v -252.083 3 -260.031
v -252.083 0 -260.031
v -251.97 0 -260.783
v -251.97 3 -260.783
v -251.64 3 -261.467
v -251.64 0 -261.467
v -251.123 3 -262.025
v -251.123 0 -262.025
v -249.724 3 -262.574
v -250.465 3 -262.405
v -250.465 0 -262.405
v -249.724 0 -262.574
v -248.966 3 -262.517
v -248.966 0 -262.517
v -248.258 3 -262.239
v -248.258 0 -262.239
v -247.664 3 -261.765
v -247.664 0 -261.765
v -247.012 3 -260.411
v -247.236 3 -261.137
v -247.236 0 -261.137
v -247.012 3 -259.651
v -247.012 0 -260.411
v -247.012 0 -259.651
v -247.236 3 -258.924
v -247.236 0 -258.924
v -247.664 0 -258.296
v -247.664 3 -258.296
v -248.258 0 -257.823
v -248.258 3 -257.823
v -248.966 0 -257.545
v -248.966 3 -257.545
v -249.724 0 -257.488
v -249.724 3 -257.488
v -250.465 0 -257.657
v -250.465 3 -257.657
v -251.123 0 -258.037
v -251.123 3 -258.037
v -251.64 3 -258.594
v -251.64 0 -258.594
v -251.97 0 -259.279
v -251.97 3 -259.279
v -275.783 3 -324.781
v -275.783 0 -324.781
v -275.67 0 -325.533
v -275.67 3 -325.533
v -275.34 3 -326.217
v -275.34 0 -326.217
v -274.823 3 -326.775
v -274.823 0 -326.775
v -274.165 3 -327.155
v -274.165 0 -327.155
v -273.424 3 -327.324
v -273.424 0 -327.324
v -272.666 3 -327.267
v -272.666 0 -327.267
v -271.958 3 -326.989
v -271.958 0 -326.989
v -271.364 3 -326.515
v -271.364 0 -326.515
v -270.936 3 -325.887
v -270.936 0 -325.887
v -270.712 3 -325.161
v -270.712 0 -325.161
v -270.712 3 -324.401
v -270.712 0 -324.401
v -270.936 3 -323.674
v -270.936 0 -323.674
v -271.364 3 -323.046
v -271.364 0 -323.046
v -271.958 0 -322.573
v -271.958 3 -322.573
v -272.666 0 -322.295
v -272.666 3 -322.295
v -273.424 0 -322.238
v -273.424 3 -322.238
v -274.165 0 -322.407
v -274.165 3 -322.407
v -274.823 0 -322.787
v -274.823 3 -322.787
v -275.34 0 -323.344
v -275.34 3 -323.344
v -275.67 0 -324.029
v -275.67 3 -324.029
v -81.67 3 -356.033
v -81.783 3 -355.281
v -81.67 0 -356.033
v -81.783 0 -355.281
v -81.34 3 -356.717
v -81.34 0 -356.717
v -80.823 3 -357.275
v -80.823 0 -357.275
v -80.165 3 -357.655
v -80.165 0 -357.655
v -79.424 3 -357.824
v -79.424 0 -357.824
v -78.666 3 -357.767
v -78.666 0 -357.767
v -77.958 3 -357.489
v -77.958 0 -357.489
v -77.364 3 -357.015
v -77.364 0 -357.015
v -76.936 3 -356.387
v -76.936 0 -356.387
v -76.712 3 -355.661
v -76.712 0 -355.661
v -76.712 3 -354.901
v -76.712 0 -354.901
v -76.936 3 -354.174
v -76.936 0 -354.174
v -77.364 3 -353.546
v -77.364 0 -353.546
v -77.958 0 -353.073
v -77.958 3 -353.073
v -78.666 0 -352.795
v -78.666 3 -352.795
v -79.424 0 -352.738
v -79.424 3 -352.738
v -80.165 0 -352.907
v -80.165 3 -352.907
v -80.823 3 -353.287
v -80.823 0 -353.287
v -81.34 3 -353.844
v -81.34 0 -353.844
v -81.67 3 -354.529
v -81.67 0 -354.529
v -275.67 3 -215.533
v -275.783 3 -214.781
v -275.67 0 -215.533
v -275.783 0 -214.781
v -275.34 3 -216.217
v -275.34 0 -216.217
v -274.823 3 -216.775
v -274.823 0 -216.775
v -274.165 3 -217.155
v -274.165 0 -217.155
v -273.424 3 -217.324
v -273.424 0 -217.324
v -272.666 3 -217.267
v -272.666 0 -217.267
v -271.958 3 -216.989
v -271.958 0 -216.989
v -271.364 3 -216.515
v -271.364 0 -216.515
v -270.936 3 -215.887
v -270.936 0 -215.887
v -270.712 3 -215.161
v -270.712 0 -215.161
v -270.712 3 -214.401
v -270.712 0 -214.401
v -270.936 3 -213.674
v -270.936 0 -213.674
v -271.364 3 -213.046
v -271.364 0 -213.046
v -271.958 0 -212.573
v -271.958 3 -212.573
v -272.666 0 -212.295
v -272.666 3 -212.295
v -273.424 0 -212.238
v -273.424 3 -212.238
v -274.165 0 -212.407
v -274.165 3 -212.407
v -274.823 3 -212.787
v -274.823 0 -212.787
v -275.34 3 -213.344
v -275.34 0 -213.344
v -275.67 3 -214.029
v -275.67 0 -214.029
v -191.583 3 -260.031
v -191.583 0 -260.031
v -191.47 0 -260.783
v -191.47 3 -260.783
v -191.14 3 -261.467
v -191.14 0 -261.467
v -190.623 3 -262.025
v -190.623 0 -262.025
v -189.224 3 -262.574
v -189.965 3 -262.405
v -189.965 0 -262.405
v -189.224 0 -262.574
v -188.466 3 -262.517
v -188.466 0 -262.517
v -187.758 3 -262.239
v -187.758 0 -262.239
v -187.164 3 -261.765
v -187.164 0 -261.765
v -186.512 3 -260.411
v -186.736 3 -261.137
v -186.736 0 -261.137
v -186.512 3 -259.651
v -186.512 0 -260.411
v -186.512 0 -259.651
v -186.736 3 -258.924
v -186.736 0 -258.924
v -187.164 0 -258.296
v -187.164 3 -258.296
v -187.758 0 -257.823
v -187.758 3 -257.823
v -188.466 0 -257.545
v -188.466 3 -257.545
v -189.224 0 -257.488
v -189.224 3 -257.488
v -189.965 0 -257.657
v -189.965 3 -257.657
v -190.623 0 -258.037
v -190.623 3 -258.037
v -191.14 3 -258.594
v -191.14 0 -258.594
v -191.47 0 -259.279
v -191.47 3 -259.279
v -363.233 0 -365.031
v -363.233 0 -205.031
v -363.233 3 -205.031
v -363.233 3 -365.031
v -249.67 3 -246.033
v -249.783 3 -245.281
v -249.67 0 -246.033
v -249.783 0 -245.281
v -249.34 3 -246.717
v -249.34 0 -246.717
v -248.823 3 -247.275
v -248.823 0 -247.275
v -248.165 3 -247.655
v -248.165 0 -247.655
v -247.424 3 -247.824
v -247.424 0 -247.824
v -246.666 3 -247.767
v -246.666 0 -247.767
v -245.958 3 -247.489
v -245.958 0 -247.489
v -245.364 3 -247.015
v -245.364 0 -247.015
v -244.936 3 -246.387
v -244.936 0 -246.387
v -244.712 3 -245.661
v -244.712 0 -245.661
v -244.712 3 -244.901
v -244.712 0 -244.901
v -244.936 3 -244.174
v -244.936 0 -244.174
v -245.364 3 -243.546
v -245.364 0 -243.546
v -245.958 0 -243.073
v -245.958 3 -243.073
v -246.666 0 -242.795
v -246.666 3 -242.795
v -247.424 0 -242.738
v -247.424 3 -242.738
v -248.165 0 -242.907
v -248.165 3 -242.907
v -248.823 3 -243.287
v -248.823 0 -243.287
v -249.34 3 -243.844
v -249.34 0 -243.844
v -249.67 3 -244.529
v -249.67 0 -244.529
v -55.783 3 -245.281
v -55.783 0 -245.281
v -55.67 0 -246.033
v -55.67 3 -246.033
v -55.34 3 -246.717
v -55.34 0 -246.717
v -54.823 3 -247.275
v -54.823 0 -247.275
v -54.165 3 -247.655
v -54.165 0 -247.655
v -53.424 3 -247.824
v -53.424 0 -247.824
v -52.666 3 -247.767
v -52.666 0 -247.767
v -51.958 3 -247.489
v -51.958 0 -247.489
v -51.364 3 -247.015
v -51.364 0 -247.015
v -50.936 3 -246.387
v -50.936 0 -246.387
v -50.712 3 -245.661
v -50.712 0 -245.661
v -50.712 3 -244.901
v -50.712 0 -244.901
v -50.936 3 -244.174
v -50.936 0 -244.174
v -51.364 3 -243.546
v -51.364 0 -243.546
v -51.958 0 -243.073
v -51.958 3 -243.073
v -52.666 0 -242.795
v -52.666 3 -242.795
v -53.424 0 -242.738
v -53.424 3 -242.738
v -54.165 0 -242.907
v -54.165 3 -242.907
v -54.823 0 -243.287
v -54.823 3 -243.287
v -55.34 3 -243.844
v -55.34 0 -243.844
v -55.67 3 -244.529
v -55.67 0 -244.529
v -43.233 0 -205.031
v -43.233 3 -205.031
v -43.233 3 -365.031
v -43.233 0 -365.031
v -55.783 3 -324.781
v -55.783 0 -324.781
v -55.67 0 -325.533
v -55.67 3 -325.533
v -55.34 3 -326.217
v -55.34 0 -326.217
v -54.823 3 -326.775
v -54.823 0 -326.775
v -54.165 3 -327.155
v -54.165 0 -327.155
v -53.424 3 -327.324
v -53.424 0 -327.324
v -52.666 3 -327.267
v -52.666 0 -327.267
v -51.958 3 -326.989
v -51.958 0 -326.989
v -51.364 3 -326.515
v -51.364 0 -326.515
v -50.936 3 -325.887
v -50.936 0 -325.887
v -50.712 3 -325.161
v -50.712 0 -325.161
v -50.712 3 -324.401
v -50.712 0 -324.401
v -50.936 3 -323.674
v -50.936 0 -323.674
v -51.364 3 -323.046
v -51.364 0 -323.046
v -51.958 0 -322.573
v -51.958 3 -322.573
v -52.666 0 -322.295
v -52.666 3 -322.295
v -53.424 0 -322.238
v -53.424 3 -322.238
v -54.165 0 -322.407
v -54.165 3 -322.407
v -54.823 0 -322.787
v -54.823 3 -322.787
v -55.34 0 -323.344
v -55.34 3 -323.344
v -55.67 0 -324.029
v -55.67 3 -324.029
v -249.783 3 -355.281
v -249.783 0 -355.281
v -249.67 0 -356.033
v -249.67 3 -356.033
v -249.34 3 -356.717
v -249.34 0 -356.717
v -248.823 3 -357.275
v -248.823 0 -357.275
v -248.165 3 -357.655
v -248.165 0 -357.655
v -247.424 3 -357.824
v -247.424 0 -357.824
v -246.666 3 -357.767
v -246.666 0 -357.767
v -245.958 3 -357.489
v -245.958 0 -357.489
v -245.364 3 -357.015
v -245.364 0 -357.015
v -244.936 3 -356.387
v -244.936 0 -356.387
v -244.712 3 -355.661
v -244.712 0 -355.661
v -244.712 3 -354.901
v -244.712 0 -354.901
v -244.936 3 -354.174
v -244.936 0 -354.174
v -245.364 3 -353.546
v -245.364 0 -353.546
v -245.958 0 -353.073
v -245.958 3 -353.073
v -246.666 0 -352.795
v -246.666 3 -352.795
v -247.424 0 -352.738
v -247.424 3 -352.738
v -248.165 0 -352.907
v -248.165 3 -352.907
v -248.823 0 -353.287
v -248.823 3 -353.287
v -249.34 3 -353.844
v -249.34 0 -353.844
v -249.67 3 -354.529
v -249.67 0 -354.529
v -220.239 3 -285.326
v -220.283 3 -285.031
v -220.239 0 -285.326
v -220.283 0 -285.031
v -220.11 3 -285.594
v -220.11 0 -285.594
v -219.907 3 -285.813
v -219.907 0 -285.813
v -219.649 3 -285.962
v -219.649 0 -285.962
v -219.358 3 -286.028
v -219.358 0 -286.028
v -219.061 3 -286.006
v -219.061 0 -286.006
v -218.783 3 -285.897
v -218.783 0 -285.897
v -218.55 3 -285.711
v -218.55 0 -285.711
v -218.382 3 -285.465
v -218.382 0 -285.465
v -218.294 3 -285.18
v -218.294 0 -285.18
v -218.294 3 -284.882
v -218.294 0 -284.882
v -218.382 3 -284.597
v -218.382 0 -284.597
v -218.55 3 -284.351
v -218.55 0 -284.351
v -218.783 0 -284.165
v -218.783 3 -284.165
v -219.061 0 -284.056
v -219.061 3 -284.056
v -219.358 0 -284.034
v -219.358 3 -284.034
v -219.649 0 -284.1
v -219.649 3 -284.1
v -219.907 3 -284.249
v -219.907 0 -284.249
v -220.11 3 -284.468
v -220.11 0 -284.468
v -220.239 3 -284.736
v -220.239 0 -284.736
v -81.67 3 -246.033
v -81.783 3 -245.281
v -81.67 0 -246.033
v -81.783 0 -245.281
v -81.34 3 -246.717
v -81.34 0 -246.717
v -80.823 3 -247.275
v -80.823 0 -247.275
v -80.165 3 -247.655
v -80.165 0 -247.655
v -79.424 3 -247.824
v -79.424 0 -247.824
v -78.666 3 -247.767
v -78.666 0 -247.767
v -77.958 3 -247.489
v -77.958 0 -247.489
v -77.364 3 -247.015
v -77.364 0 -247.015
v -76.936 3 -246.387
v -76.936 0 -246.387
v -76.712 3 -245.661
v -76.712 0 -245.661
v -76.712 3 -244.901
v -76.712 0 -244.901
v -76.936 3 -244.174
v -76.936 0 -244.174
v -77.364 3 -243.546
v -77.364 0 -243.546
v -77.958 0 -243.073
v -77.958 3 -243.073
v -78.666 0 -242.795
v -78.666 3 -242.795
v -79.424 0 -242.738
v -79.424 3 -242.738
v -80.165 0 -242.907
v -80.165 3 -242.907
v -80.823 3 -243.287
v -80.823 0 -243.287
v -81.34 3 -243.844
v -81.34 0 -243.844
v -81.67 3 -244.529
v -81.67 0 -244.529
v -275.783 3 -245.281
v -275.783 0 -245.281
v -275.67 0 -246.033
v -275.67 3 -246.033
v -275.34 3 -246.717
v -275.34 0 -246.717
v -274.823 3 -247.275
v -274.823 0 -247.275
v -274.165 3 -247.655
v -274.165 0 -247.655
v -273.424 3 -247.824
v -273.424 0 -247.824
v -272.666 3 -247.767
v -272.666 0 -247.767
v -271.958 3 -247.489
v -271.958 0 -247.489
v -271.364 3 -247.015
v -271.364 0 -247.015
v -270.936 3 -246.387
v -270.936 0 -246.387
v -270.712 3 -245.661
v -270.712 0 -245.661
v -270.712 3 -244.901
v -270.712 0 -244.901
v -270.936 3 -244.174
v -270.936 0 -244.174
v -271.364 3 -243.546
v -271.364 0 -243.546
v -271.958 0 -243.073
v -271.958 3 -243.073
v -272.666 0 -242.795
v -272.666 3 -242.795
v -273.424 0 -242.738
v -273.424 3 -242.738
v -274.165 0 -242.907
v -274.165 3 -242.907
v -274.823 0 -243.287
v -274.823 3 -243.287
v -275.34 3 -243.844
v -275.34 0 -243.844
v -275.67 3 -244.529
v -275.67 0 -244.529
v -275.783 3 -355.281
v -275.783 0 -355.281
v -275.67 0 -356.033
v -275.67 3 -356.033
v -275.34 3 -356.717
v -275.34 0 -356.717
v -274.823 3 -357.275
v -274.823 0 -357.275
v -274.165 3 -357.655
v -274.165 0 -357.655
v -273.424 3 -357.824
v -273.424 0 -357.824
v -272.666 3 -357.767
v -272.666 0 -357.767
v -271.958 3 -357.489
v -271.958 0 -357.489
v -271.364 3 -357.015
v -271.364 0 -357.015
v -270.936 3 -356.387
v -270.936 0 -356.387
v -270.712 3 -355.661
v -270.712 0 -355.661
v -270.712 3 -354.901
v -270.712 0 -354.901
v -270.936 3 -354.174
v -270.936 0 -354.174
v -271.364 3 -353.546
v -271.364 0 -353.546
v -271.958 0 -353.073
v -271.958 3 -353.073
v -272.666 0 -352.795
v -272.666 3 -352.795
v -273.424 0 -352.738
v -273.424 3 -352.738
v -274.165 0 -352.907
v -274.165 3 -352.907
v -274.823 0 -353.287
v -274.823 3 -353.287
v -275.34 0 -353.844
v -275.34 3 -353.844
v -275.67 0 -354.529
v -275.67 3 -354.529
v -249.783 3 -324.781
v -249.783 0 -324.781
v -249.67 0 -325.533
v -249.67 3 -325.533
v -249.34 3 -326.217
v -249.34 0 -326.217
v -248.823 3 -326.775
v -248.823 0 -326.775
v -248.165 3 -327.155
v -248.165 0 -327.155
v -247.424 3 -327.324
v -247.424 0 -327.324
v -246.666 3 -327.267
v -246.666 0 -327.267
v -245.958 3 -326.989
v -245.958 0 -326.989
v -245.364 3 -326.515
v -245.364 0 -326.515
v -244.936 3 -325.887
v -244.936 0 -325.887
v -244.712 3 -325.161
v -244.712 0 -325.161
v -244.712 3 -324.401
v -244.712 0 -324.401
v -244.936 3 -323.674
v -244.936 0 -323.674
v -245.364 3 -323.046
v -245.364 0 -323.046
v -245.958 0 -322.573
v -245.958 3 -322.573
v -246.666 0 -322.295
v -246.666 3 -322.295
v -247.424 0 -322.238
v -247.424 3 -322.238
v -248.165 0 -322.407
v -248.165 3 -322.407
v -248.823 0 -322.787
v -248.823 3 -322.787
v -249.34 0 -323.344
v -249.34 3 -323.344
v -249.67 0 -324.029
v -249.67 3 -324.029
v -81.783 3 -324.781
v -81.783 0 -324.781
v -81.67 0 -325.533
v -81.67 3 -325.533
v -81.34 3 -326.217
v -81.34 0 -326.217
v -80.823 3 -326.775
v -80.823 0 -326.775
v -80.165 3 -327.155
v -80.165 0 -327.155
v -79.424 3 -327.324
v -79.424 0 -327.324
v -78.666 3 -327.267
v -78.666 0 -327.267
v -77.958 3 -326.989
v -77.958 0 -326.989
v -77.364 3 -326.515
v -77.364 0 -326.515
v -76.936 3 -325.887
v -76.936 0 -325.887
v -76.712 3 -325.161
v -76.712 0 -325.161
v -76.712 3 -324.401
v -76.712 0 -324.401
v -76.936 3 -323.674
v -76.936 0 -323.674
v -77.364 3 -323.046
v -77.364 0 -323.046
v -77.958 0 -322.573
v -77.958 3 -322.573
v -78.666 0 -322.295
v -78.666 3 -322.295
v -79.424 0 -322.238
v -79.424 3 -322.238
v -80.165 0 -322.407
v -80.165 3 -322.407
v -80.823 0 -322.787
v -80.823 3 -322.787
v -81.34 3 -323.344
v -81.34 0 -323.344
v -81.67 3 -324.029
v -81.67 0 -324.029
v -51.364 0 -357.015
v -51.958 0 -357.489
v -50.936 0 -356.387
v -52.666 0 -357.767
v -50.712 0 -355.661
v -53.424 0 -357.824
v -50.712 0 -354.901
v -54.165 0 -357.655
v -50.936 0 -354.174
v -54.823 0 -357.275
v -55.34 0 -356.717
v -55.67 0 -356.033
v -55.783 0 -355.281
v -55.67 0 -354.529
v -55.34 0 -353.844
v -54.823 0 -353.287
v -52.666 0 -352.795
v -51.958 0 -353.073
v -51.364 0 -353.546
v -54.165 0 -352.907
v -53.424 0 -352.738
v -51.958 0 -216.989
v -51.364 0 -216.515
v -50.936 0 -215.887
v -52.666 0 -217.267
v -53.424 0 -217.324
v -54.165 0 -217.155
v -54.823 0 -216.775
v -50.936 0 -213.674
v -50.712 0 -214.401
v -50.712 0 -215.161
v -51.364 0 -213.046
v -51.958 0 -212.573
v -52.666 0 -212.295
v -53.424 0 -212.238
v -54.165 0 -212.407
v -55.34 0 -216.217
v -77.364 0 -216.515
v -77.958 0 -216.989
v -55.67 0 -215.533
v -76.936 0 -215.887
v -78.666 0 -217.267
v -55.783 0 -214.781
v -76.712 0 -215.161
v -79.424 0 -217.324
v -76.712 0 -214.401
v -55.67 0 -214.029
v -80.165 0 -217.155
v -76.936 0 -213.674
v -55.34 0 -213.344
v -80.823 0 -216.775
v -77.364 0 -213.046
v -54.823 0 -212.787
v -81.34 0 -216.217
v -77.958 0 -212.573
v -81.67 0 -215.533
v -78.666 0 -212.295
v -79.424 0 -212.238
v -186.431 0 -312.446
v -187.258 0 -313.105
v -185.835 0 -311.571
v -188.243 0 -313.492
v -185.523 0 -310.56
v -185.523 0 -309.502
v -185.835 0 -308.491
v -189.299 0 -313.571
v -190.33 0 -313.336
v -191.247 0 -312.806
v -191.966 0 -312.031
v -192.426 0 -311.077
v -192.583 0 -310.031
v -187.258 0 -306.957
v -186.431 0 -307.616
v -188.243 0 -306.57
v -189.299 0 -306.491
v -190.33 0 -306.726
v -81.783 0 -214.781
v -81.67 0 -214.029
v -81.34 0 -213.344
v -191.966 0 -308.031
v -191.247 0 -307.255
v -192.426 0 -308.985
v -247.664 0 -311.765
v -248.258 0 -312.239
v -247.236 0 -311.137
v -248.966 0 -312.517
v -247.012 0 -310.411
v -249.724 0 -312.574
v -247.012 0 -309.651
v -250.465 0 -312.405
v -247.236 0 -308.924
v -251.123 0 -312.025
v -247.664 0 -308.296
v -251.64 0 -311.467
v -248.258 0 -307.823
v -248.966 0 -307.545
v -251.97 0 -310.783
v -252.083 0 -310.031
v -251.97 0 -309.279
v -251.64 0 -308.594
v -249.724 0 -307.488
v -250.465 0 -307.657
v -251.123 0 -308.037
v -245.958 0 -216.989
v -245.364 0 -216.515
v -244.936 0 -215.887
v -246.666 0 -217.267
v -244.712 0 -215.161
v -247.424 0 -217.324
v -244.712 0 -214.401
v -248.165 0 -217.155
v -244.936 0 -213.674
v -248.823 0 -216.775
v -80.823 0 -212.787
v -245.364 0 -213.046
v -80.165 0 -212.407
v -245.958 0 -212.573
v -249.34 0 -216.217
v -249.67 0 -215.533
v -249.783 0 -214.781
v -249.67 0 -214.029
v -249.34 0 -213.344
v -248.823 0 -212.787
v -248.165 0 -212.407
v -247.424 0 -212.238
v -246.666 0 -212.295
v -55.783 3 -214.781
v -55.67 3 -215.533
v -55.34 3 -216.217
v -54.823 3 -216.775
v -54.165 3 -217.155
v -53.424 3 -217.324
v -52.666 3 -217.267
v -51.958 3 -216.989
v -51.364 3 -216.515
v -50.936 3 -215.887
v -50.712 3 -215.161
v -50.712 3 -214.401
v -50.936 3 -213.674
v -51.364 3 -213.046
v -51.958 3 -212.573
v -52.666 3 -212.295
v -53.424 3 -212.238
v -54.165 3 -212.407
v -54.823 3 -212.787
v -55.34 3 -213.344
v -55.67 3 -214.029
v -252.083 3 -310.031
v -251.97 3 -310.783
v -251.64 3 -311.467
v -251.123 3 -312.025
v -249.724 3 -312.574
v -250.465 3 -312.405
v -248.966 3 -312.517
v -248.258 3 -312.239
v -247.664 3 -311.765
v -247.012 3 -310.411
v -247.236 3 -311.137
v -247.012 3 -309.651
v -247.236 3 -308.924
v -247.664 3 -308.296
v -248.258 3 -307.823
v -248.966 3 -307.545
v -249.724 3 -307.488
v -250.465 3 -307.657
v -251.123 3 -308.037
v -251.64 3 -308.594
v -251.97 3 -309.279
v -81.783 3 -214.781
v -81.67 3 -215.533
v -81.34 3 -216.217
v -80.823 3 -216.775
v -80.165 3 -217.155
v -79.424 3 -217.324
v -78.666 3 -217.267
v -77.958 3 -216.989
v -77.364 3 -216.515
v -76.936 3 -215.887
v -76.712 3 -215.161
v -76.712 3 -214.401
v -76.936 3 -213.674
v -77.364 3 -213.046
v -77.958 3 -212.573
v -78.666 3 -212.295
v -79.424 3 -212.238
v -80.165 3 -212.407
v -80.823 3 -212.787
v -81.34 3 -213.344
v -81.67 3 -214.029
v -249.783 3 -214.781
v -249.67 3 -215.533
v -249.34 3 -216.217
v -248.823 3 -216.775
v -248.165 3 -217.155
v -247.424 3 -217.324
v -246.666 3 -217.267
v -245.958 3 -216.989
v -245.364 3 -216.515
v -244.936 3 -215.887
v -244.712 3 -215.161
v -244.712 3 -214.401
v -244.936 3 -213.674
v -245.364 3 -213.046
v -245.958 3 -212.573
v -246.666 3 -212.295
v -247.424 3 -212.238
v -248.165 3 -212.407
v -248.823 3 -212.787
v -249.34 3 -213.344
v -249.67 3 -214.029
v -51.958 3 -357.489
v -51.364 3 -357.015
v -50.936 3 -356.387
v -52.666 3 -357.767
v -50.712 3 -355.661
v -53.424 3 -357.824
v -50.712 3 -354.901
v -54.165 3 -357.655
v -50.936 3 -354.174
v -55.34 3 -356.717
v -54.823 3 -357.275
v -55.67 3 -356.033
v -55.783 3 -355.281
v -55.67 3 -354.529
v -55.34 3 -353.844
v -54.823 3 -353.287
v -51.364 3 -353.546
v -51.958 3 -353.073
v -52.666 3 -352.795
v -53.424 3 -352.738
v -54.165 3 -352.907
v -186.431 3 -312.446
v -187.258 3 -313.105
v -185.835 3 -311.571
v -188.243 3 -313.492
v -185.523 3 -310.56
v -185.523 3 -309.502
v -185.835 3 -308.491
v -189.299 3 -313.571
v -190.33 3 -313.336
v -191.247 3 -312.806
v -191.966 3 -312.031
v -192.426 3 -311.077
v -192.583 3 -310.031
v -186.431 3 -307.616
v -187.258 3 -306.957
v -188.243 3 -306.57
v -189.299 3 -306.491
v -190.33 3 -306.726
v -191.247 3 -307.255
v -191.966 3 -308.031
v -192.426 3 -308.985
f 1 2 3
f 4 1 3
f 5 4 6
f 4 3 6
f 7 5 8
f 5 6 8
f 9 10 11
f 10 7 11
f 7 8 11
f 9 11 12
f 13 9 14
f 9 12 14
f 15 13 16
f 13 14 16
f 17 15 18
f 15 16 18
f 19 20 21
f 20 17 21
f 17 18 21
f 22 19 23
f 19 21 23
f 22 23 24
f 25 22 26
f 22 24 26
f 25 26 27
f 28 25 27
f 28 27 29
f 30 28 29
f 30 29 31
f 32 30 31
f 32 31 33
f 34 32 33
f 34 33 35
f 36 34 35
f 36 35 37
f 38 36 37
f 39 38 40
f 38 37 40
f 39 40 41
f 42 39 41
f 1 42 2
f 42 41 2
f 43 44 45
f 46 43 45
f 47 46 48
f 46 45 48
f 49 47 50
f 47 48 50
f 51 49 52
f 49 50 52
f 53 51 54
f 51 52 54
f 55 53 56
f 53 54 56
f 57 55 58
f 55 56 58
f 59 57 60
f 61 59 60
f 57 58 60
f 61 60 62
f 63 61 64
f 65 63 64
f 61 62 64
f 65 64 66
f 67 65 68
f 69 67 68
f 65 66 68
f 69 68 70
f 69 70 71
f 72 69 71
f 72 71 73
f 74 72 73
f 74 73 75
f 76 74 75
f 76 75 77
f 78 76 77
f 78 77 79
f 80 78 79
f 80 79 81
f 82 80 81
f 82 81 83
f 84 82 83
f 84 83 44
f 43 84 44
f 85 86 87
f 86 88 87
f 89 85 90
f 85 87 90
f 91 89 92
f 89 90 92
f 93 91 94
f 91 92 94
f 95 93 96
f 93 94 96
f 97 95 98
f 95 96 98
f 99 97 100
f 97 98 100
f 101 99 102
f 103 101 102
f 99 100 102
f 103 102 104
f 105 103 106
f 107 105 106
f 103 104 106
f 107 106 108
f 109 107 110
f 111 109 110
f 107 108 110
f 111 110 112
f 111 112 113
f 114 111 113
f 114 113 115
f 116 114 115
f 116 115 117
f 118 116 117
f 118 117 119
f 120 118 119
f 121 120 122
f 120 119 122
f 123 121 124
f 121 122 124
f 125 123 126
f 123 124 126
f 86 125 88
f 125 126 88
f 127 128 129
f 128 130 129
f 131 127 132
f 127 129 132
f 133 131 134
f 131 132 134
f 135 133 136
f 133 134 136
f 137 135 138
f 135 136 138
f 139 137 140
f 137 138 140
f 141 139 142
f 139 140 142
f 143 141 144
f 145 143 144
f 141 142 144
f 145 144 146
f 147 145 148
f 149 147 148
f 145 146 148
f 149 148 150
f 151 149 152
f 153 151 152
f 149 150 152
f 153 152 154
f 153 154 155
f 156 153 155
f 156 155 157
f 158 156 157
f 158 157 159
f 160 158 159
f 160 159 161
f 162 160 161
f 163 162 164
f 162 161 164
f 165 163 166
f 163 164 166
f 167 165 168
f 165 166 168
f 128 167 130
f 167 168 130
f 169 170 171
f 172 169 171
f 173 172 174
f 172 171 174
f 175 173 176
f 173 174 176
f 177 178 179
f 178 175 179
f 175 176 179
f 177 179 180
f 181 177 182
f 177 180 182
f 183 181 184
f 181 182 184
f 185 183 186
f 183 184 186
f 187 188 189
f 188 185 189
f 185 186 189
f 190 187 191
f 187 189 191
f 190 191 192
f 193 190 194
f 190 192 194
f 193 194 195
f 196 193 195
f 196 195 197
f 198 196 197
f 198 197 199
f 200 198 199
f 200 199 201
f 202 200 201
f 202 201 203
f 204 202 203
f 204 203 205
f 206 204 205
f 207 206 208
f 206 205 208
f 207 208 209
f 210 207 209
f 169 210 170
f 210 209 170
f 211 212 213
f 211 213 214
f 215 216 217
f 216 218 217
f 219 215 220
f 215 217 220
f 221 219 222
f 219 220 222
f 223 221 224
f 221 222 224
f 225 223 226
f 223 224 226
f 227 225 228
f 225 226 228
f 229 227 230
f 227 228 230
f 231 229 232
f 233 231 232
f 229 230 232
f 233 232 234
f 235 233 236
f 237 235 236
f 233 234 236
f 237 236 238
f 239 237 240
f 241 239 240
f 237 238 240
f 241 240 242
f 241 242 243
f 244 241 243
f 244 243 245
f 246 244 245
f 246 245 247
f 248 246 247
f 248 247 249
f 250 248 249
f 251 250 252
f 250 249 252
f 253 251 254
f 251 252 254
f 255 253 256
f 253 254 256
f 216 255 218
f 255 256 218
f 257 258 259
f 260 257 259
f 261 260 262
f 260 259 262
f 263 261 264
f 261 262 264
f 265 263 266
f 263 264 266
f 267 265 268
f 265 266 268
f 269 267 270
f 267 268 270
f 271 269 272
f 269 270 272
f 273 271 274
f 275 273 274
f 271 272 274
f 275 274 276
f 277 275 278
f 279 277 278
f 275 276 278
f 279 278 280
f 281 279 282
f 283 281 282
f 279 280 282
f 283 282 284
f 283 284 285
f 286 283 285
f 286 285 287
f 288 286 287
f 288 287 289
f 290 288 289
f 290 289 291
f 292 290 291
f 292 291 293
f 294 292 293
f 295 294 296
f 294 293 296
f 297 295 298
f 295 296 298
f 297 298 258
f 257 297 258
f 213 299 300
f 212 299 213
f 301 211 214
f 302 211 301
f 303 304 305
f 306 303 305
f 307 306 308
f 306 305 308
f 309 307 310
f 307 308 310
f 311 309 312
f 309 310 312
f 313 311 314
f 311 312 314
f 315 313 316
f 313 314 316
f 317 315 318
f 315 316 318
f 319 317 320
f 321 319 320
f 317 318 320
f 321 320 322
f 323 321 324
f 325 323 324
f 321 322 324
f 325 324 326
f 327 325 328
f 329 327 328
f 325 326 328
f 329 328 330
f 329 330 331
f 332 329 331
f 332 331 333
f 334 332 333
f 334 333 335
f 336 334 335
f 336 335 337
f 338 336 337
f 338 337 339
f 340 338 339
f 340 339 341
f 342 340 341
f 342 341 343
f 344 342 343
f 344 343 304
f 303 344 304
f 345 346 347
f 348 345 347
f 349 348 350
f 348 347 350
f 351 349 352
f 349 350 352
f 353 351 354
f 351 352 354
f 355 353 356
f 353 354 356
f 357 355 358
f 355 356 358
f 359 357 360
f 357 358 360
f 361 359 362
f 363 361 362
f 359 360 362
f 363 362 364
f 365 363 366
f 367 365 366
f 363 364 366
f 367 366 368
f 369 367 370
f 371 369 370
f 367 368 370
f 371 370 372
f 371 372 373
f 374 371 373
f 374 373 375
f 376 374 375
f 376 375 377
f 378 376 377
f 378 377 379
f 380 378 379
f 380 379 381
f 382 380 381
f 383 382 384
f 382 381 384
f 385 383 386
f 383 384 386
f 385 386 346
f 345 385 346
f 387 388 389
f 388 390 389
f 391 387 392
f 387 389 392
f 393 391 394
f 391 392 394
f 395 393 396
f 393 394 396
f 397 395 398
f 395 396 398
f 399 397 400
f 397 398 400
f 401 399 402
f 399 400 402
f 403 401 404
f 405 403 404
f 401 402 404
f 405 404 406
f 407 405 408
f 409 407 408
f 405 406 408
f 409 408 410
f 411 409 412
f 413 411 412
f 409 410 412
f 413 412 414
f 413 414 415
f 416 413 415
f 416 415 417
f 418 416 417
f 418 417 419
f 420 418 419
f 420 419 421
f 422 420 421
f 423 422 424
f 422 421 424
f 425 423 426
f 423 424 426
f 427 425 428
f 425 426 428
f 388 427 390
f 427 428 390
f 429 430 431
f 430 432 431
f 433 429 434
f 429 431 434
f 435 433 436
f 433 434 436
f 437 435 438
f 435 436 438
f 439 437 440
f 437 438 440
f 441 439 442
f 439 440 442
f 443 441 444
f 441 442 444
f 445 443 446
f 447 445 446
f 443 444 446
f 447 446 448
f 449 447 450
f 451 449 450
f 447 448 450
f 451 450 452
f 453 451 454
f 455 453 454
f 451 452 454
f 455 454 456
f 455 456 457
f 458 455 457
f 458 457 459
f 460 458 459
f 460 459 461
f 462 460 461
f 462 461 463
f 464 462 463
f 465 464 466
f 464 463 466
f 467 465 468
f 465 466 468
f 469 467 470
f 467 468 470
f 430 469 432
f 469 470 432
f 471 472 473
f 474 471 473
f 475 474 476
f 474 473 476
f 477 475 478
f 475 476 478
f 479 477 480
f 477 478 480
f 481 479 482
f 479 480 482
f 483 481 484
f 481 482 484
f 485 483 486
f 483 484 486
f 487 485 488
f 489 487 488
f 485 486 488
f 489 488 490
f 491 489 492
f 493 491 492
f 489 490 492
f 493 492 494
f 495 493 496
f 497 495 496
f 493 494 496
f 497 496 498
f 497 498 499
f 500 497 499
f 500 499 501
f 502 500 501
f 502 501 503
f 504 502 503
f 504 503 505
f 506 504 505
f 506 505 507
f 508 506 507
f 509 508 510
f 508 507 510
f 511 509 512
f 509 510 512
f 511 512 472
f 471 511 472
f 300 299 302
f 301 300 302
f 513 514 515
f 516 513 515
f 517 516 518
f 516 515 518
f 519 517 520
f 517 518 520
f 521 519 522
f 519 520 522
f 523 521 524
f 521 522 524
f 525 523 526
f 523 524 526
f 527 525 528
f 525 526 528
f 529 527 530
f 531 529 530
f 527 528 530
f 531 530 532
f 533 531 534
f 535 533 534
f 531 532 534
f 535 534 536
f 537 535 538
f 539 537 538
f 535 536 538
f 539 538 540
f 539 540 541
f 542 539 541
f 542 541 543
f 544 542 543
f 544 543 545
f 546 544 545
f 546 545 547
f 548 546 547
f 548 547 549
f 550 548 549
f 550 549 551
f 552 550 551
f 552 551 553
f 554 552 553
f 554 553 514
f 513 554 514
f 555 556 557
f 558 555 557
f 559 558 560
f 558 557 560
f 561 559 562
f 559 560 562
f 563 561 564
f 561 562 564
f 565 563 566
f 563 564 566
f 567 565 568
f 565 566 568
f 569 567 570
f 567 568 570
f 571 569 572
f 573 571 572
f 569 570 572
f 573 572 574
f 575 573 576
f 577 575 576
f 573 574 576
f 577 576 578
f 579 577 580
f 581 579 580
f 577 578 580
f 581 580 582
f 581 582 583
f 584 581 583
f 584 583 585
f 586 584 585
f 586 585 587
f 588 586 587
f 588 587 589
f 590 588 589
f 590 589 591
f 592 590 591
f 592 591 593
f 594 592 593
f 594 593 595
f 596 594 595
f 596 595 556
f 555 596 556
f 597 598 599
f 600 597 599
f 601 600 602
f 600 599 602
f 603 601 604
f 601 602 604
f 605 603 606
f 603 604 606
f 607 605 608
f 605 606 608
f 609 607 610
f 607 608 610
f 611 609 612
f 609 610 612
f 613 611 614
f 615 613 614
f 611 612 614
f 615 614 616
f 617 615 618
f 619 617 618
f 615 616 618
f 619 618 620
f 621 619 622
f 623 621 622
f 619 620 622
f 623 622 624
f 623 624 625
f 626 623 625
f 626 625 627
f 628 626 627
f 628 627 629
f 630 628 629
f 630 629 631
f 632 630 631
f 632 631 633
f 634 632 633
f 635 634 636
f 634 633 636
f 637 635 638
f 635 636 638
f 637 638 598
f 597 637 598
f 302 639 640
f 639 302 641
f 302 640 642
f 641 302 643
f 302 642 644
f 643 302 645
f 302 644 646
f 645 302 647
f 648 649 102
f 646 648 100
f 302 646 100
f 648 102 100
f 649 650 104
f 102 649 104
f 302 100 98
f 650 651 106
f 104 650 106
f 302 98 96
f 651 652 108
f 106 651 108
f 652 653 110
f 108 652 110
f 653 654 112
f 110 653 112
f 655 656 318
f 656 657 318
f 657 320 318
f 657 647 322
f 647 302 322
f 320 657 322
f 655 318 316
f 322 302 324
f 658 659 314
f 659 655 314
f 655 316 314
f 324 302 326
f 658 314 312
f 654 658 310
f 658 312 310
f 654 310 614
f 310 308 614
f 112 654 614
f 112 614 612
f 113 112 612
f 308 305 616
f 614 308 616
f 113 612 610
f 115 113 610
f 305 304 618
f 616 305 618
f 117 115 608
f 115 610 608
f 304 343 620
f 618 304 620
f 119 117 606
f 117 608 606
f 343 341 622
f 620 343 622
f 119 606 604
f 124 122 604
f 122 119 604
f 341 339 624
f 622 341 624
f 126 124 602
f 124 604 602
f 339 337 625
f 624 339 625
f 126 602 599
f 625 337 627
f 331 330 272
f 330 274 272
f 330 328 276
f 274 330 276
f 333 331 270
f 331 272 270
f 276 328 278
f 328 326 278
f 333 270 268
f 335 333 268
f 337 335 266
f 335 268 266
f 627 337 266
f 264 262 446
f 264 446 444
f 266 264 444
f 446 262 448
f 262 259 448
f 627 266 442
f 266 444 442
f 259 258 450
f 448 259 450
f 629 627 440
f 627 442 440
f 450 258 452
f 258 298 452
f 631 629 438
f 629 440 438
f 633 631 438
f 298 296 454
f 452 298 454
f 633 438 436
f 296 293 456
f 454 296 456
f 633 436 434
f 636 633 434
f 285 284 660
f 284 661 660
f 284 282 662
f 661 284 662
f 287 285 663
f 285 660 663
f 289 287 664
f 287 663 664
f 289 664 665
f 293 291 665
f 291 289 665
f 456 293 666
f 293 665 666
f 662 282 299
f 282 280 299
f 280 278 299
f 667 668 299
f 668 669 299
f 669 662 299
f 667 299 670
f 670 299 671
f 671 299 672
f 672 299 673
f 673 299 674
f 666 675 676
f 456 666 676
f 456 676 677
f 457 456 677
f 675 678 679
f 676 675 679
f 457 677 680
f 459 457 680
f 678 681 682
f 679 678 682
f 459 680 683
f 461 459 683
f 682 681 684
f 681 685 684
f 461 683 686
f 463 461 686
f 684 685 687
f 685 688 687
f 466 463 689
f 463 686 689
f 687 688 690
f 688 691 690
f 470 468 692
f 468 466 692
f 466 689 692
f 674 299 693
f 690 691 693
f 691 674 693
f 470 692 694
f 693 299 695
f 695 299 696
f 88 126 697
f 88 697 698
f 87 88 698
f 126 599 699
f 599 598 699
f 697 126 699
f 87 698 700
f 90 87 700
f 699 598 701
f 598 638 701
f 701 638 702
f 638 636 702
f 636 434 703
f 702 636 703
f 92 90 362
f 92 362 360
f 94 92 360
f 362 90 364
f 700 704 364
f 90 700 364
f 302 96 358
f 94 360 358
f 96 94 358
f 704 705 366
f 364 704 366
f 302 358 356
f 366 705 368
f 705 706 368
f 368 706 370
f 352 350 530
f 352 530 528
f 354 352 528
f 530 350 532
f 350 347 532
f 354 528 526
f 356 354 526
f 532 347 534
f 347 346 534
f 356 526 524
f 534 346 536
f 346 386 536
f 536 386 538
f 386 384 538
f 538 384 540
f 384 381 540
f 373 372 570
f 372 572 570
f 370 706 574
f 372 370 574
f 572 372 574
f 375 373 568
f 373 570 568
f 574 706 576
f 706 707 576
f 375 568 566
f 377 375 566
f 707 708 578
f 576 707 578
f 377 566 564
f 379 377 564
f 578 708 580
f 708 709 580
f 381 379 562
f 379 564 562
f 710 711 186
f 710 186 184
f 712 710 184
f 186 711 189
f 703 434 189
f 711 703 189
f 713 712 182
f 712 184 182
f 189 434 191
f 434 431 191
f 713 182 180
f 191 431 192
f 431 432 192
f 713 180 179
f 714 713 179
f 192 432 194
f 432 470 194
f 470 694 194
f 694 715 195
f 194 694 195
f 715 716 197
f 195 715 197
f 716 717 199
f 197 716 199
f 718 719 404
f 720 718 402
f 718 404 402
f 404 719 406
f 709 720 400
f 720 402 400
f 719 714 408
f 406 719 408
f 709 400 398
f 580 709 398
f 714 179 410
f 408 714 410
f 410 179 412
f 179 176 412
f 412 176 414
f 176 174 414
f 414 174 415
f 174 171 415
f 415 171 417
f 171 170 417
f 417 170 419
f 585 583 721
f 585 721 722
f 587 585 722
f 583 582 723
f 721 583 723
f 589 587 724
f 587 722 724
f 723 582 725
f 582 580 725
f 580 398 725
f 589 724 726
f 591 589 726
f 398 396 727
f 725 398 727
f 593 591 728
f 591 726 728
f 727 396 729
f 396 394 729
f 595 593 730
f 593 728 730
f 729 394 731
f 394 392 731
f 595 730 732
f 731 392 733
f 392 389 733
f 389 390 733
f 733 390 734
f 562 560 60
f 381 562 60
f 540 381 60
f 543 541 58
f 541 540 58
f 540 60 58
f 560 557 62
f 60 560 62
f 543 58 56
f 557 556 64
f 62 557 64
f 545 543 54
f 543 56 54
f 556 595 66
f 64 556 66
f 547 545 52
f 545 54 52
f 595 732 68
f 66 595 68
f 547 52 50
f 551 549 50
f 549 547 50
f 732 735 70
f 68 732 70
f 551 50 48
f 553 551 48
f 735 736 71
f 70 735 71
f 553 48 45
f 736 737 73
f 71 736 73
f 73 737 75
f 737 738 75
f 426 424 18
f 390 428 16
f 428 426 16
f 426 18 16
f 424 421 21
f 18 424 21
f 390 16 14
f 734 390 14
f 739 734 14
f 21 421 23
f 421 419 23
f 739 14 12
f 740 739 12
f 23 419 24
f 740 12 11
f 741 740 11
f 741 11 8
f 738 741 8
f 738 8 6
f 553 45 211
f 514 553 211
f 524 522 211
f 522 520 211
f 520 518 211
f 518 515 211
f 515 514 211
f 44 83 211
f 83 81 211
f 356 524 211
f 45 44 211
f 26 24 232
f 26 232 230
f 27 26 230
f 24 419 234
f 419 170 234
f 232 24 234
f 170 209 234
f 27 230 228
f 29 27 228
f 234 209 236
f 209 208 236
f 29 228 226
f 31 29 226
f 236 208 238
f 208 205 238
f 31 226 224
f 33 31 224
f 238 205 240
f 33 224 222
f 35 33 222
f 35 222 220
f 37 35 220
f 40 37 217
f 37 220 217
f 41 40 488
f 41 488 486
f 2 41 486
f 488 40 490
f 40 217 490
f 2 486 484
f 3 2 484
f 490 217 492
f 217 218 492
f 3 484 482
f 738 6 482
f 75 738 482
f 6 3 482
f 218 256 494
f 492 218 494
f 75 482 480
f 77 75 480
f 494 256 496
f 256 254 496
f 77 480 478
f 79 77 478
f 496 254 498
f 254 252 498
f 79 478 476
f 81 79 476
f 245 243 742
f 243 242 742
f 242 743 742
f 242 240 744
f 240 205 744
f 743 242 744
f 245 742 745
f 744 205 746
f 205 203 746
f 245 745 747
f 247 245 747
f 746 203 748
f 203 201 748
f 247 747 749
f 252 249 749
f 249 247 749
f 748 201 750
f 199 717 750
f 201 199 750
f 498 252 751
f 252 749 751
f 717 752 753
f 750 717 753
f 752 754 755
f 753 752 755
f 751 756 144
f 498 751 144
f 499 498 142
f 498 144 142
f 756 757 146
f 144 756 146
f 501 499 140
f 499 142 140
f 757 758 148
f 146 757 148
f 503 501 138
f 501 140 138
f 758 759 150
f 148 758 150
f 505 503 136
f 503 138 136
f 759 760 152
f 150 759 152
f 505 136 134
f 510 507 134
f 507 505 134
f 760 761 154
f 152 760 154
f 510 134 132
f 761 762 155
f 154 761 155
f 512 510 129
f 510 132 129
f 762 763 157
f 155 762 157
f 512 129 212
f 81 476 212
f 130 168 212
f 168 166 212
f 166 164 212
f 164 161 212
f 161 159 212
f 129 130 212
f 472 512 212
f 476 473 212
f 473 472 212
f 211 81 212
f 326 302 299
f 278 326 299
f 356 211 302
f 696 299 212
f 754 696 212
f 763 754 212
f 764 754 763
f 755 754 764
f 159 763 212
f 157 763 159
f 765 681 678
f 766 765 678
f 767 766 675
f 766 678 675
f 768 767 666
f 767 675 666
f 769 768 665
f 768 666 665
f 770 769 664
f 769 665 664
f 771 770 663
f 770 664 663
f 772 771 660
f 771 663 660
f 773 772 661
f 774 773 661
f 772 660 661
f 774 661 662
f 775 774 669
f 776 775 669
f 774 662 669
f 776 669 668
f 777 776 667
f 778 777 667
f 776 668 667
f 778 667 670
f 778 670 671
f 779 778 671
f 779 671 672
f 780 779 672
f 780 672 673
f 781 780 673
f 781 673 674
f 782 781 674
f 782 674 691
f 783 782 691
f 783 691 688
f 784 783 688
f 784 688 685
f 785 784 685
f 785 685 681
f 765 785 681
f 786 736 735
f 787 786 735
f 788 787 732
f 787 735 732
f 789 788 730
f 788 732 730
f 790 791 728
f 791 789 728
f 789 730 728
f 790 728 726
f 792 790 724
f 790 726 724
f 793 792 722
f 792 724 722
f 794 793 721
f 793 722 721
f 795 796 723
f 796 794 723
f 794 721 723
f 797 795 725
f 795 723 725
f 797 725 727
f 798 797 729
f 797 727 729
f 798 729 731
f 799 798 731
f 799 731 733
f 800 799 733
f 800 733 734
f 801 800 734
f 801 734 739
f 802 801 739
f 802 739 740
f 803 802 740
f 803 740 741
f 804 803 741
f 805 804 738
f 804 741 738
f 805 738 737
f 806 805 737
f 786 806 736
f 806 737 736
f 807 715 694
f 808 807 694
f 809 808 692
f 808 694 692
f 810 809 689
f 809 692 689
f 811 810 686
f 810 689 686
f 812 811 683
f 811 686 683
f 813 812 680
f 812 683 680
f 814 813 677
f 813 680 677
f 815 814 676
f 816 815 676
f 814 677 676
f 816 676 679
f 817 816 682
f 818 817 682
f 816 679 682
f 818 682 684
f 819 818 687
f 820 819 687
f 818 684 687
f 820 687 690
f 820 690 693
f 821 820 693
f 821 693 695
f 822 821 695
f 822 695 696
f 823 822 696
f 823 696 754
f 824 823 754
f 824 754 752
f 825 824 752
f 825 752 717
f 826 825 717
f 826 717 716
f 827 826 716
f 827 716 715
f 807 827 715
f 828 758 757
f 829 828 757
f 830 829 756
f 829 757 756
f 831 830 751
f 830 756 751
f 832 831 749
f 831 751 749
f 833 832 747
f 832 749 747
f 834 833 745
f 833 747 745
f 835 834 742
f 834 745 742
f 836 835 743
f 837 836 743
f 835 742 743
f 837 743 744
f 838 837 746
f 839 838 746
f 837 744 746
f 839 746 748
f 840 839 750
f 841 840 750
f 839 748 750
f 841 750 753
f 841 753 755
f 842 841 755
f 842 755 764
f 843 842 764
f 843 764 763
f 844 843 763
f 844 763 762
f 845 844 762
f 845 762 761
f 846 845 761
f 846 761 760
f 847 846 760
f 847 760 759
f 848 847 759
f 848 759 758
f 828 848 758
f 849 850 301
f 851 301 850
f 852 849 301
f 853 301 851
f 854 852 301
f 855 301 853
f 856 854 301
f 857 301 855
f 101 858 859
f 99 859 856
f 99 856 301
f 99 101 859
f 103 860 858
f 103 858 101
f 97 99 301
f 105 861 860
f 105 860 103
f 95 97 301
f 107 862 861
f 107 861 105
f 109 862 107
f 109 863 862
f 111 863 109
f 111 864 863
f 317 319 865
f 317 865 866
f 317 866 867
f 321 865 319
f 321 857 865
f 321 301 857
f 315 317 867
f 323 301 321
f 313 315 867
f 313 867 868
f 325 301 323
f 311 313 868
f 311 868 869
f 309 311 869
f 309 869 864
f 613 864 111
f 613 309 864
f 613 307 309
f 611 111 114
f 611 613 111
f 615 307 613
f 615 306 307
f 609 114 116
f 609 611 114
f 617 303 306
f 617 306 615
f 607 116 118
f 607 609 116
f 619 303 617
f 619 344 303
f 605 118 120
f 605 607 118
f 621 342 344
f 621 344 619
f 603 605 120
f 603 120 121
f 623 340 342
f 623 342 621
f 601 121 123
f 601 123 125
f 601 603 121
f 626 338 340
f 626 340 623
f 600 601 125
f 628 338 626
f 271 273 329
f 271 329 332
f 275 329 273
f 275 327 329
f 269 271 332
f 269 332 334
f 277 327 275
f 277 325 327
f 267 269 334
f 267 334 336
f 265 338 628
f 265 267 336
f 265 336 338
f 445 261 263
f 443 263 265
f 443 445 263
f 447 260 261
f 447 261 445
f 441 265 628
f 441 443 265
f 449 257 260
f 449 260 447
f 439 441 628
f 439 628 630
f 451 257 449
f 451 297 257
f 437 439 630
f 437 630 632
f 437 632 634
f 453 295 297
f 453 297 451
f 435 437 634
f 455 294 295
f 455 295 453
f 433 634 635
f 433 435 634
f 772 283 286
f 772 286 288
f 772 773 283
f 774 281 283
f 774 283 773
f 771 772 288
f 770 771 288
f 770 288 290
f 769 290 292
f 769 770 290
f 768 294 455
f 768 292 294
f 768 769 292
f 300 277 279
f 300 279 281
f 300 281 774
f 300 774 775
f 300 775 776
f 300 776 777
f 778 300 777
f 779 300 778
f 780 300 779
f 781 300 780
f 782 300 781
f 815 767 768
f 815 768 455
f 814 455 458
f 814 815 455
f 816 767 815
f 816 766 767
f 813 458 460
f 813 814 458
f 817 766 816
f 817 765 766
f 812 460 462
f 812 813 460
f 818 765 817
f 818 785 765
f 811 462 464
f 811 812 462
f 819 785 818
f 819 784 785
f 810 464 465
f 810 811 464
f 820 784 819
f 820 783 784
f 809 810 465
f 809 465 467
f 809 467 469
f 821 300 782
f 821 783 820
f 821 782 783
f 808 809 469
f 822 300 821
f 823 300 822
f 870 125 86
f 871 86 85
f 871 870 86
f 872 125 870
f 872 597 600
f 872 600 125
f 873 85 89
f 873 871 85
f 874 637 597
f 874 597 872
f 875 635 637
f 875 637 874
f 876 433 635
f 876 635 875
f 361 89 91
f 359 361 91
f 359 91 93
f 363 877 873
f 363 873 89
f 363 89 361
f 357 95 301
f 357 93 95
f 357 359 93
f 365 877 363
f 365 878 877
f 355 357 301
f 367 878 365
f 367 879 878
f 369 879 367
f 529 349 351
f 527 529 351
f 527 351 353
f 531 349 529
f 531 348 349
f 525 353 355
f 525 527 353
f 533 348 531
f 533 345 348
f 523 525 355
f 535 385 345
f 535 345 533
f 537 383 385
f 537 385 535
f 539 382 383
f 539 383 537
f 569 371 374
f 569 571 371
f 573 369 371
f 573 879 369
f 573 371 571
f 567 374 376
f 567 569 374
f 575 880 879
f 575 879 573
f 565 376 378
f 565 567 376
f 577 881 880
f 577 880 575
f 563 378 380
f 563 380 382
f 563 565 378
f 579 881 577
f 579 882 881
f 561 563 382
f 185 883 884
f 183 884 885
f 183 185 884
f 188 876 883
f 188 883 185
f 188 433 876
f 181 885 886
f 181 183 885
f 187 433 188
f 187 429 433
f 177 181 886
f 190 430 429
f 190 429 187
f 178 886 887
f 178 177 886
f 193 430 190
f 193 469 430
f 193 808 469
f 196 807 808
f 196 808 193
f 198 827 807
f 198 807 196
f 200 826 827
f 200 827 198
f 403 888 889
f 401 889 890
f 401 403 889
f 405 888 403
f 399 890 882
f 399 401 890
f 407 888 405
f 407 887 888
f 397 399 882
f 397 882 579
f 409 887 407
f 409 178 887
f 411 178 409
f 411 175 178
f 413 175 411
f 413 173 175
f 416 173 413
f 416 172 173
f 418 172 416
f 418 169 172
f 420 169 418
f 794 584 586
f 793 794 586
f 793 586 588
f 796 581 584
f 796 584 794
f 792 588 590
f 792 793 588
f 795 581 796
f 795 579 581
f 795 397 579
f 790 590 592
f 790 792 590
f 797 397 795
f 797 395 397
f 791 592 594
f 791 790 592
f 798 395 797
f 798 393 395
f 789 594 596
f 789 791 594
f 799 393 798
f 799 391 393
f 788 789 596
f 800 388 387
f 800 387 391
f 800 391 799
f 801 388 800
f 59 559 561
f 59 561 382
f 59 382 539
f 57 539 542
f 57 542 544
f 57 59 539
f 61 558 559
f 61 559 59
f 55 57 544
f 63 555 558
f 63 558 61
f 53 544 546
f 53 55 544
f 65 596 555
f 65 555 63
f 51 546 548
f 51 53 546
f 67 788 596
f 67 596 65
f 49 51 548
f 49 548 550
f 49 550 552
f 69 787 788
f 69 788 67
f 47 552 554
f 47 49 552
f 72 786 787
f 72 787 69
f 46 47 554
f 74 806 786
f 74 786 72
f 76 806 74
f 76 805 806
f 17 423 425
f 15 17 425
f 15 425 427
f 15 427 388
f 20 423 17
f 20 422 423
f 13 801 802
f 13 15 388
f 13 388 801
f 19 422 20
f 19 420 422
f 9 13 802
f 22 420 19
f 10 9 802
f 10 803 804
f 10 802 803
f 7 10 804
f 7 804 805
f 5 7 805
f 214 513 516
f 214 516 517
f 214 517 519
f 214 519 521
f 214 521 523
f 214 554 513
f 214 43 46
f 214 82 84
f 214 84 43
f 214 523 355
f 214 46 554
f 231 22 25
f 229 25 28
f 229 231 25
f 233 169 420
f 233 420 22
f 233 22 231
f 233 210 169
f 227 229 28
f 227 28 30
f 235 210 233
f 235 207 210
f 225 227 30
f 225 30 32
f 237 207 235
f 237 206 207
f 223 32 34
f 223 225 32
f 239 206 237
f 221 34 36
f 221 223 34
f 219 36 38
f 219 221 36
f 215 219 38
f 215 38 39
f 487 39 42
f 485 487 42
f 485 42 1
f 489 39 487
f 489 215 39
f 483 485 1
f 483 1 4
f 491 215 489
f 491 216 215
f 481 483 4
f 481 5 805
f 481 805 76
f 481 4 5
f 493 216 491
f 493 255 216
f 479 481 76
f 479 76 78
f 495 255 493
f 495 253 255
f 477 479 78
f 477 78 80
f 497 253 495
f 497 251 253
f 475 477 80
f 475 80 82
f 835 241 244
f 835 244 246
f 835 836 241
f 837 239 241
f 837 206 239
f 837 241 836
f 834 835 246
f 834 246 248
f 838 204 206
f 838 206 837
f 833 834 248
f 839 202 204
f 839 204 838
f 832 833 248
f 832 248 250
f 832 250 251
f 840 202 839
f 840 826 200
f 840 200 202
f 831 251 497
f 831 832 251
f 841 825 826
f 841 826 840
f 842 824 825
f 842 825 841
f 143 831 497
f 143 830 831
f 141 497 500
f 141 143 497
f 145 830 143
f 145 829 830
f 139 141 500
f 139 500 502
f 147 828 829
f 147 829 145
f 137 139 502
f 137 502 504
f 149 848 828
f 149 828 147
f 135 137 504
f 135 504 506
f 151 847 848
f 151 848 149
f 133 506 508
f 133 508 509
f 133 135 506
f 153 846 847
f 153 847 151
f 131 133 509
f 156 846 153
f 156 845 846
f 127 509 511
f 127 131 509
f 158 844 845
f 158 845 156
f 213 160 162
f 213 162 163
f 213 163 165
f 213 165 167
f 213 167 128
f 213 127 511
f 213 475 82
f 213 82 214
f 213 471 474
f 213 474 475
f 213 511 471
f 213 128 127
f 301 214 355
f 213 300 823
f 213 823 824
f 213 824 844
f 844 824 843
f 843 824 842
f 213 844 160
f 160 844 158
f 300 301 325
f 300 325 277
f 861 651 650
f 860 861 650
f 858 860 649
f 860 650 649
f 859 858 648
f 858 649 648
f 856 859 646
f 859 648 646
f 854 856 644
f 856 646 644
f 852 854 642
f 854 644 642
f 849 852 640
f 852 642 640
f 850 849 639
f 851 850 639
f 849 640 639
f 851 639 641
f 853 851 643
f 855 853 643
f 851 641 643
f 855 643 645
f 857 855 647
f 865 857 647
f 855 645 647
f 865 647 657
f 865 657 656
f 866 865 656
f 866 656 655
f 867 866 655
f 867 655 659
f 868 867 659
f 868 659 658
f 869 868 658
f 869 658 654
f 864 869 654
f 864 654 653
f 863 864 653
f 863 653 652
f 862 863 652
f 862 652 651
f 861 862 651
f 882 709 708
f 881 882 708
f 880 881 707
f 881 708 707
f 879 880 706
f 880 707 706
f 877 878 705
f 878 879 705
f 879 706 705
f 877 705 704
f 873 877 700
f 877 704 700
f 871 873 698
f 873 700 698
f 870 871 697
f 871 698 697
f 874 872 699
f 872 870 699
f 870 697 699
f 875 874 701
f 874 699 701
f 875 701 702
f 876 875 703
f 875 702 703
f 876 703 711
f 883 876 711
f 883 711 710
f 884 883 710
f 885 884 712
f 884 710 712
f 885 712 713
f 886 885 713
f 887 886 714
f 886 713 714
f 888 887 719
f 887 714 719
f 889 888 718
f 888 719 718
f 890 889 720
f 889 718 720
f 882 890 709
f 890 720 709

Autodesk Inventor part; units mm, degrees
ref_plane "YZ Plane" through (0, 0, 0) normal (1, 0, 0) x (0, 1, 0)
ref_plane "XZ Plane" through (0, 0, 0) normal (0, 1, 0) x (-1, 0, 0)
ref_plane "XY Plane" through (0, 0, 0) normal (0, 0, 1) x (1, 0, 0)
sketch "Sketch1" plane through (0, 0, 0) normal (0, 1, 0) x (-1, 0, 0)
  line L0 (263.2333, -205.0309) -> (43.2333, -205.0309)
  line L1 (43.2333, -205.0309) -> (43.2333, -365.0309)
  line L2 (43.2333, -365.0309) -> (263.2333, -365.0309)
  line L3 (263.2333, -260.0309) -> (263.2333, -205.0309)
  line L4 (249.5333, -205.0309) -> (249.5333, -365.0309) construction
  line L5 (363.2333, -260.0309) -> (43.2333, -260.0309) construction
  line L6 (363.2333, -285.0309) -> (43.2333, -285.0309) construction
  line L7 (249.5333, -365.0309) -> (249.5333, -205.0309) construction
  line L8 (363.2333, -310.0309) -> (43.2333, -310.0309) construction
  line L9 (189.0333, -205.0309) -> (189.0333, -365.0309) construction
  circle A0 centre (249.5333, -260.0309) radius 2.55
  circle A1 centre (249.5333, -310.0309) radius 2.55
  circle A2 centre (189.0333, -260.0309) radius 2.55
  circle A3 centre (189.0333, -310.0309) radius 3.55
  line L10 (219.2833, -205.0309) -> (219.2833, -365.0309) construction
  circle A4 centre (219.2833, -285.0309) radius 1
  line L11 (263.2333, -205.0309) -> (363.2333, -205.0309)
  line L12 (363.2333, -205.0309) -> (363.2333, -365.0309)
  line L13 (363.2333, -365.0309) -> (263.2333, -365.0309)
  line L14 (363.2333, -230.0309) -> (43.2333, -230.0309) construction
  line L15 (363.2333, -340.0309) -> (43.2333, -340.0309) construction
  line L16 (363.2333, -214.7809) -> (270.7929, -214.7809) construction
  circle A5 centre (273.2333, -214.7809) radius 2.55
  line L17 (260.2333, -205.0309) -> (260.2333, -242.3907) construction
  circle A6 centre (273.2333, -245.2809) radius 2.55
  circle A7 centre (247.2333, -214.7809) radius 2.55
  circle A8 centre (247.2333, -245.2809) radius 2.55
  circle A9 centre (273.2333, -355.2809) radius 2.55
  circle A10 centre (273.2333, -324.7809) radius 2.55
  circle A11 centre (247.2333, -355.2809) radius 2.55
  circle A12 centre (247.2333, -324.7809) radius 2.55
  line L18 (163.2333, -205.0309) -> (163.2333, -365.0309) construction
  circle A13 centre (53.2333, -214.7809) radius 2.55
  circle A14 centre (53.2333, -245.2809) radius 2.55
  circle A15 centre (79.2333, -214.7809) radius 2.55
  circle A16 centre (79.2333, -245.2809) radius 2.55
  circle A17 centre (53.2333, -355.2809) radius 2.55
  circle A18 centre (53.2333, -324.7809) radius 2.55
  circle A19 centre (79.2333, -324.7809) radius 2.55
  circle A20 centre (79.2333, -355.2809) radius 2.55
  point P0 (0, 0)
  point P1 (263.2333, -310.0309)
  dimension "d2" = 13.7
  dimension "d4" = 60.5
  dimension "d5" = 5.1
  dimension "d6" = 5.1
  dimension "d7" = 5.1
  dimension "d8" = 7.1
  dimension "d11" = 2
  dimension "d15" = 50
  dimension "d17" = 100
  dimension "d18" = 25
  dimension "d19" = 15.25
  dimension "d20" = 5.1
  dimension "d21" = 13
  dimension "d22" = 90
  dimension "d23" = 160
  dimension "d24" = 110
  dimension "d27" = 320
extrude "Extrusion1" add sketch "Sketch1" along normal blind 3 contours L11 L12 L13 L2 L1 L0 | A4 | A5 | A6 | A7 | A8 | A9 | A10 | A11 | A12 | A13 | A14 | A15 | A16 | A17 | A18 | A19 | A20
sketch "Sketch2" plane through (0, 3, 0) normal (0, 1, 0) x (1, 0, 0)
  point P0 (0, 0)
extrude "Extrusion2" cut sketch "Sketch1" along normal through all contours A4
extrude "Extrusion3" cut sketch "Sketch1" along normal through all contours A5 | A6 | A7 | A8 | A9 | A10 | A11 | A12 | A13 | A14 | A15 | A16 | A17 | A18 | A19 | A20
properties part number "V Rail Gantry" material "Aluminum 6061"
